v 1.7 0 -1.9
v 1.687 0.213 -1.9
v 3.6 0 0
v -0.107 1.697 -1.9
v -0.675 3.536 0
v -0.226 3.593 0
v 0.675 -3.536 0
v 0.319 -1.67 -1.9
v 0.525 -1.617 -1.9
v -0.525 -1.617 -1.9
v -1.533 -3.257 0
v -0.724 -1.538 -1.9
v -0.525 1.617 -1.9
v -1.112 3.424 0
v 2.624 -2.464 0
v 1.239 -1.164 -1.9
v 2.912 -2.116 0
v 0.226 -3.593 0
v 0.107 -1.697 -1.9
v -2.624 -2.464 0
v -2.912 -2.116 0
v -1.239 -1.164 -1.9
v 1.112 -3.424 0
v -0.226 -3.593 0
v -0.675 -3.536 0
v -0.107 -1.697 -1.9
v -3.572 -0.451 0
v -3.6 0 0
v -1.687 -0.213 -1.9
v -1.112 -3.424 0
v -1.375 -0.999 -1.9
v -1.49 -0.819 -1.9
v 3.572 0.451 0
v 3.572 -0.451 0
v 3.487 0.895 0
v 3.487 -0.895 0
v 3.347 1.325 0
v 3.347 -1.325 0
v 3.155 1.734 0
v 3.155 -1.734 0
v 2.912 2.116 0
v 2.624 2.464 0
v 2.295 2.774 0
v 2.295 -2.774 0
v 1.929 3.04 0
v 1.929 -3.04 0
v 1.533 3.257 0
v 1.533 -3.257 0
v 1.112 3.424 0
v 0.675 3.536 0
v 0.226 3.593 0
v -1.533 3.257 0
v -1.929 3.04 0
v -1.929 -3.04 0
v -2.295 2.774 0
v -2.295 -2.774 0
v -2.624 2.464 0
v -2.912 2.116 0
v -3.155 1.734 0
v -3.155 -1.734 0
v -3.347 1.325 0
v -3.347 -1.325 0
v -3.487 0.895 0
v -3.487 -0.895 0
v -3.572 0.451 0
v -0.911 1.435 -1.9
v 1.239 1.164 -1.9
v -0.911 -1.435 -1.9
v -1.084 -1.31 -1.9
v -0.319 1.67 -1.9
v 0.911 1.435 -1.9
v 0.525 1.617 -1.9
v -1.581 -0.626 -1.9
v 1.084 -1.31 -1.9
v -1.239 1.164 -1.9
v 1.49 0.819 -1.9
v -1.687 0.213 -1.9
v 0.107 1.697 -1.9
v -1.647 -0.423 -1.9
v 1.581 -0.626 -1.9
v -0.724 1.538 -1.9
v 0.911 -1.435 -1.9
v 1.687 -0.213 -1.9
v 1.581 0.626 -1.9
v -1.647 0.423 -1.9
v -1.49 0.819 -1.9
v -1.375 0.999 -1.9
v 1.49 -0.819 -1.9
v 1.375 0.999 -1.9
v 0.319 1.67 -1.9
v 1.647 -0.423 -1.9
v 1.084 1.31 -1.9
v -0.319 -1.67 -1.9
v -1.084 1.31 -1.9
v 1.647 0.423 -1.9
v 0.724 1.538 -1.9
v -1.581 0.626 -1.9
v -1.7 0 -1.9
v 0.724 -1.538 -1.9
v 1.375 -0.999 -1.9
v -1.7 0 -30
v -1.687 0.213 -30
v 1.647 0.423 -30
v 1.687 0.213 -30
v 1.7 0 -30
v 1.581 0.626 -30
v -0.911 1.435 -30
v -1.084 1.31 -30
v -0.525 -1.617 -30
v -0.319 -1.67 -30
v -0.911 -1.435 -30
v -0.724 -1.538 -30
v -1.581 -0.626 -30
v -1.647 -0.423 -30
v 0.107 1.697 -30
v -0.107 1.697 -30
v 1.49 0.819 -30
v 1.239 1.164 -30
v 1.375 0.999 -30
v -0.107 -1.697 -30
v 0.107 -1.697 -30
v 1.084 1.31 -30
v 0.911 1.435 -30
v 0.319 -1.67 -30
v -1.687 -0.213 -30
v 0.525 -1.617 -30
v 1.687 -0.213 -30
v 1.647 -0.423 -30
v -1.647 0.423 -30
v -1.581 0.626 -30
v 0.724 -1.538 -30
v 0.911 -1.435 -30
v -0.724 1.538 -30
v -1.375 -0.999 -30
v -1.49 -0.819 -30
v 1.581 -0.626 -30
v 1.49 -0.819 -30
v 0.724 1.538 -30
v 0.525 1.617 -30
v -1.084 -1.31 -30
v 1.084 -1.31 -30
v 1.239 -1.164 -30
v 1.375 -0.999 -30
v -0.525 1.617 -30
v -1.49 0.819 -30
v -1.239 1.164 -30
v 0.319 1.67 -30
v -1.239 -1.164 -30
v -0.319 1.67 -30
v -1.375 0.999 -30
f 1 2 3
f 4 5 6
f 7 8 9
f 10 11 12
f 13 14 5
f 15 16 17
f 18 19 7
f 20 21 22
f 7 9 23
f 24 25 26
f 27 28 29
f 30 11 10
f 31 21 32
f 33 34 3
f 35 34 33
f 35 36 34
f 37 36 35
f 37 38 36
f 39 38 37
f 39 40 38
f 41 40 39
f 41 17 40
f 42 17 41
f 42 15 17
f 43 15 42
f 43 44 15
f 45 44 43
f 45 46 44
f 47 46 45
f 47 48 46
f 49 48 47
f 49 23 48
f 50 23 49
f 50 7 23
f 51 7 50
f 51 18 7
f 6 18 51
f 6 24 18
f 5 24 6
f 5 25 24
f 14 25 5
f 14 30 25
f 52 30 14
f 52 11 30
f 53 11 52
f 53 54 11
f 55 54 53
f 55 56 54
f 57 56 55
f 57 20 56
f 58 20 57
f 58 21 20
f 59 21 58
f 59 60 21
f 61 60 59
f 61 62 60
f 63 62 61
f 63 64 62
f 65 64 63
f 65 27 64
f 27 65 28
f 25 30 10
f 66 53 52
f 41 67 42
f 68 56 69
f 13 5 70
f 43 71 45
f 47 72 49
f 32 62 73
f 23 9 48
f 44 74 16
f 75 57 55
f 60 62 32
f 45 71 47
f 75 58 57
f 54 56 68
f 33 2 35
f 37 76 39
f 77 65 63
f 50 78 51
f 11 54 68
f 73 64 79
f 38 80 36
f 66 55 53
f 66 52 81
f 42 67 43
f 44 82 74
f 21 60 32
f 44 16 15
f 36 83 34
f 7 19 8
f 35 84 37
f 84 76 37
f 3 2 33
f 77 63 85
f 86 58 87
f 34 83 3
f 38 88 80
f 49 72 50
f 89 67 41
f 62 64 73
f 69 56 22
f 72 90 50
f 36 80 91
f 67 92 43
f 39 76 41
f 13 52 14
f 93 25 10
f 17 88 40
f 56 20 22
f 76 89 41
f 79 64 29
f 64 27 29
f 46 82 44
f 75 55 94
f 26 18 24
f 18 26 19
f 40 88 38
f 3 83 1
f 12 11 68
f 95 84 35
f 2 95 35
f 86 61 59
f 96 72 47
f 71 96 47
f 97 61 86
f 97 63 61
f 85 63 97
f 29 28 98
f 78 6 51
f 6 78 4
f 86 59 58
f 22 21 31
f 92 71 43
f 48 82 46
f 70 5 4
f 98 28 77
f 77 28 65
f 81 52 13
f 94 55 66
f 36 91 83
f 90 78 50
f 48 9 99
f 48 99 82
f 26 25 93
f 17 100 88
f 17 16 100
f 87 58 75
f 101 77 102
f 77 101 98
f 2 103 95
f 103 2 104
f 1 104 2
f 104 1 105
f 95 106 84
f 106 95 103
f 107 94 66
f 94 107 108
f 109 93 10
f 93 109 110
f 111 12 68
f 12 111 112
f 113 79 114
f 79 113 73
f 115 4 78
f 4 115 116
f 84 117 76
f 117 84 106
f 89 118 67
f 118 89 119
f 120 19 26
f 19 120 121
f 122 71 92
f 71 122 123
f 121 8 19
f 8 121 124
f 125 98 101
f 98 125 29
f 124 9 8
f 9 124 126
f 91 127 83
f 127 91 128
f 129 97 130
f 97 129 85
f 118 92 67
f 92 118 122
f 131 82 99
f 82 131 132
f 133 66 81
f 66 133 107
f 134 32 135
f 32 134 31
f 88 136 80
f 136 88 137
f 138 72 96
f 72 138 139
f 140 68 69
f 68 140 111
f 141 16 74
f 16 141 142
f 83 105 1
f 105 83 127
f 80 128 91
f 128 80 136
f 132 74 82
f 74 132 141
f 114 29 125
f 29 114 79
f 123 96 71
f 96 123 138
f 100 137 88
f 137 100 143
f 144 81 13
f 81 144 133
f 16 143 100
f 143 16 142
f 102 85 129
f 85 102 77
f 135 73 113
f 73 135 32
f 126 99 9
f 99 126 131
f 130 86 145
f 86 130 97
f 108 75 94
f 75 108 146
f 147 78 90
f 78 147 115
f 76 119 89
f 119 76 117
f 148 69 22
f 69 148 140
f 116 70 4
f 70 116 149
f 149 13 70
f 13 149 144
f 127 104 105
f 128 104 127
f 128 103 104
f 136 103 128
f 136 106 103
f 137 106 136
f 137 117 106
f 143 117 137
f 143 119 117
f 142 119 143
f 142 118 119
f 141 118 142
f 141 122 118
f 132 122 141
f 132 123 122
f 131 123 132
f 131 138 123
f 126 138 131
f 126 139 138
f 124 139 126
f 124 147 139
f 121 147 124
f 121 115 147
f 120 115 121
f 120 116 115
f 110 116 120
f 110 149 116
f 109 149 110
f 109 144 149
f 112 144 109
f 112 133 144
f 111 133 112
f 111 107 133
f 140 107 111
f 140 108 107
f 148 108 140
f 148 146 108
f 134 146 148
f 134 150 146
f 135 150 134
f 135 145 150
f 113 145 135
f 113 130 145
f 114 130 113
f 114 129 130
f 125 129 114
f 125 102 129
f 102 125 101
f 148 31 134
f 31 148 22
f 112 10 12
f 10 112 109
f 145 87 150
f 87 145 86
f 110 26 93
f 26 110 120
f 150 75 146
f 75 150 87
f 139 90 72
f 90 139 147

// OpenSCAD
$fn = 50;


difference() {
	union() {
		translate(v = [0, 0, -1.9000000000]) {
			rotate(a = [0, 0, 0]) {
				cylinder(h = 1.9000000000, r1 = 1.7000000000, r2 = 3.6000000000);
			}
		}
		translate(v = [0, 0, -30]) {
			rotate(a = [0, 0, 0]) {
				cylinder(h = 30, r = 1.7000000000);
			}
		}
	}
	union();
}
